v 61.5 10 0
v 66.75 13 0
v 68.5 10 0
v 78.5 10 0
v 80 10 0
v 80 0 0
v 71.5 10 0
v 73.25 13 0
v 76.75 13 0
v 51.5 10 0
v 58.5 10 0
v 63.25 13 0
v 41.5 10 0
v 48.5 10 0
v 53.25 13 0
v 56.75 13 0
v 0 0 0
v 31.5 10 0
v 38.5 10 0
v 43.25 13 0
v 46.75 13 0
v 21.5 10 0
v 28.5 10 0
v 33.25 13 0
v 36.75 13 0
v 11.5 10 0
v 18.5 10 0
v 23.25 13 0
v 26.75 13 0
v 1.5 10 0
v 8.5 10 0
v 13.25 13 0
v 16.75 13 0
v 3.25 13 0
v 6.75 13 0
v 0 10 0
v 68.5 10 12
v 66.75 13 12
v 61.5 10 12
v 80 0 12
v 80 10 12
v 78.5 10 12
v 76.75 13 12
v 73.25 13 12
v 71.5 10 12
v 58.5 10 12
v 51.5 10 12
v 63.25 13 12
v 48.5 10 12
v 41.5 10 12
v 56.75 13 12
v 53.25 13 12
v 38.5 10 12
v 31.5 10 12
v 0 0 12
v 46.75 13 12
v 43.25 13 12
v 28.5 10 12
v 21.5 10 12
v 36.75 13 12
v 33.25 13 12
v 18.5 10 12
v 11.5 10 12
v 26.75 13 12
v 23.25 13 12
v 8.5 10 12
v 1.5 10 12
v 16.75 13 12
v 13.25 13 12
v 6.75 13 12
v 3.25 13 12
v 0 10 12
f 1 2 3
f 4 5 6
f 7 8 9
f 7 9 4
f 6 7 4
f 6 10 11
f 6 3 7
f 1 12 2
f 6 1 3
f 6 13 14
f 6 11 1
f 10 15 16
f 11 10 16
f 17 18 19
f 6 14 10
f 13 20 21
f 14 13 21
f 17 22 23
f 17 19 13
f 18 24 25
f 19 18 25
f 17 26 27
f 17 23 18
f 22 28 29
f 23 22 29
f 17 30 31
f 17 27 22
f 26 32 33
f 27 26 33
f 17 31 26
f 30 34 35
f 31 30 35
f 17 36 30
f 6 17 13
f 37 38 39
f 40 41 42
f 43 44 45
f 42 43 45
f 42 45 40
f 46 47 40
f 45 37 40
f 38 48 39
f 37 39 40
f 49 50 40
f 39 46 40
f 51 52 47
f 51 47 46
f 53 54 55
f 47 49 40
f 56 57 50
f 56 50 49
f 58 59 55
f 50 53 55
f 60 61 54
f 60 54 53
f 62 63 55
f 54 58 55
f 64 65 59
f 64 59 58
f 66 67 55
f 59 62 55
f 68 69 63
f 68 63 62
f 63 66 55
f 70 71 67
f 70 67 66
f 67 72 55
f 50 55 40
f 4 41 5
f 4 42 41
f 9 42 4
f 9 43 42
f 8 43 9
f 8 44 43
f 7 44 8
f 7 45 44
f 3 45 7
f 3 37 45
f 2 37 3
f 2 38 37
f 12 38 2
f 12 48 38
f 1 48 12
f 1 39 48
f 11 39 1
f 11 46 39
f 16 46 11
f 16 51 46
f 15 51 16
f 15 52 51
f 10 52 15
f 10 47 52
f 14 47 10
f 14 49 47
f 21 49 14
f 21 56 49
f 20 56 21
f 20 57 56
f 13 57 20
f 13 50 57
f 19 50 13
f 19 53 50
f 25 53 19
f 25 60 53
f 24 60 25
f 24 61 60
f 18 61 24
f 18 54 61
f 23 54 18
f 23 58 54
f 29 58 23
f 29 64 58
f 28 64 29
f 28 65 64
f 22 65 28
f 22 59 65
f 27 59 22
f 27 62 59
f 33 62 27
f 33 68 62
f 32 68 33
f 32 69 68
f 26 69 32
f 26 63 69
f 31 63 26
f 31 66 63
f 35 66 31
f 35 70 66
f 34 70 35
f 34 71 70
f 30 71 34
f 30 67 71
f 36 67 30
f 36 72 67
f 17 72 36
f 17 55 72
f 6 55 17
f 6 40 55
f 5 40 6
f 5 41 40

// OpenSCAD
$fn = 32;

// ----------------------------------------------------------------------
// Gear rack: 8 teeth, pitch 10 mm
// ----------------------------------------------------------------------

// --- parameters (mm) ---
teeth = 8;                // number of teeth
pitch = 10;               // tooth pitch, X
root_w = 7;               // tooth width at the root
tip_w = 3.5;              // tooth width at the tip
base_h = 10;              // rack body height, Y
tooth_h = 3;              // tooth height above the body
plate_t = 12;             // rack width, Z (extrusion height)

rack_l = teeth * pitch;  // overall length
total_h = base_h + tooth_h;  // overall height

profile = [[0, 0], [80, 0], [80, 10], [78.5, 10], [76.75, 13], [73.25, 13], [71.5, 10], [68.5, 10], [66.75, 13], [63.25, 13], [61.5, 10], [58.5, 10], [56.75, 13], [53.25, 13], [51.5, 10], [48.5, 10], [46.75, 13], [43.25, 13], [41.5, 10], [38.5, 10], [36.75, 13], [33.25, 13], [31.5, 10], [28.5, 10], [26.75, 13], [23.25, 13], [21.5, 10], [18.5, 10], [16.75, 13], [13.25, 13], [11.5, 10], [8.5, 10], [6.75, 13], [3.25, 13], [1.5, 10], [0, 10]];  // primary outline, 36 points, counter clockwise

// --- the one profile operation ---
linear_extrude(height = plate_t) polygon(points = profile);
